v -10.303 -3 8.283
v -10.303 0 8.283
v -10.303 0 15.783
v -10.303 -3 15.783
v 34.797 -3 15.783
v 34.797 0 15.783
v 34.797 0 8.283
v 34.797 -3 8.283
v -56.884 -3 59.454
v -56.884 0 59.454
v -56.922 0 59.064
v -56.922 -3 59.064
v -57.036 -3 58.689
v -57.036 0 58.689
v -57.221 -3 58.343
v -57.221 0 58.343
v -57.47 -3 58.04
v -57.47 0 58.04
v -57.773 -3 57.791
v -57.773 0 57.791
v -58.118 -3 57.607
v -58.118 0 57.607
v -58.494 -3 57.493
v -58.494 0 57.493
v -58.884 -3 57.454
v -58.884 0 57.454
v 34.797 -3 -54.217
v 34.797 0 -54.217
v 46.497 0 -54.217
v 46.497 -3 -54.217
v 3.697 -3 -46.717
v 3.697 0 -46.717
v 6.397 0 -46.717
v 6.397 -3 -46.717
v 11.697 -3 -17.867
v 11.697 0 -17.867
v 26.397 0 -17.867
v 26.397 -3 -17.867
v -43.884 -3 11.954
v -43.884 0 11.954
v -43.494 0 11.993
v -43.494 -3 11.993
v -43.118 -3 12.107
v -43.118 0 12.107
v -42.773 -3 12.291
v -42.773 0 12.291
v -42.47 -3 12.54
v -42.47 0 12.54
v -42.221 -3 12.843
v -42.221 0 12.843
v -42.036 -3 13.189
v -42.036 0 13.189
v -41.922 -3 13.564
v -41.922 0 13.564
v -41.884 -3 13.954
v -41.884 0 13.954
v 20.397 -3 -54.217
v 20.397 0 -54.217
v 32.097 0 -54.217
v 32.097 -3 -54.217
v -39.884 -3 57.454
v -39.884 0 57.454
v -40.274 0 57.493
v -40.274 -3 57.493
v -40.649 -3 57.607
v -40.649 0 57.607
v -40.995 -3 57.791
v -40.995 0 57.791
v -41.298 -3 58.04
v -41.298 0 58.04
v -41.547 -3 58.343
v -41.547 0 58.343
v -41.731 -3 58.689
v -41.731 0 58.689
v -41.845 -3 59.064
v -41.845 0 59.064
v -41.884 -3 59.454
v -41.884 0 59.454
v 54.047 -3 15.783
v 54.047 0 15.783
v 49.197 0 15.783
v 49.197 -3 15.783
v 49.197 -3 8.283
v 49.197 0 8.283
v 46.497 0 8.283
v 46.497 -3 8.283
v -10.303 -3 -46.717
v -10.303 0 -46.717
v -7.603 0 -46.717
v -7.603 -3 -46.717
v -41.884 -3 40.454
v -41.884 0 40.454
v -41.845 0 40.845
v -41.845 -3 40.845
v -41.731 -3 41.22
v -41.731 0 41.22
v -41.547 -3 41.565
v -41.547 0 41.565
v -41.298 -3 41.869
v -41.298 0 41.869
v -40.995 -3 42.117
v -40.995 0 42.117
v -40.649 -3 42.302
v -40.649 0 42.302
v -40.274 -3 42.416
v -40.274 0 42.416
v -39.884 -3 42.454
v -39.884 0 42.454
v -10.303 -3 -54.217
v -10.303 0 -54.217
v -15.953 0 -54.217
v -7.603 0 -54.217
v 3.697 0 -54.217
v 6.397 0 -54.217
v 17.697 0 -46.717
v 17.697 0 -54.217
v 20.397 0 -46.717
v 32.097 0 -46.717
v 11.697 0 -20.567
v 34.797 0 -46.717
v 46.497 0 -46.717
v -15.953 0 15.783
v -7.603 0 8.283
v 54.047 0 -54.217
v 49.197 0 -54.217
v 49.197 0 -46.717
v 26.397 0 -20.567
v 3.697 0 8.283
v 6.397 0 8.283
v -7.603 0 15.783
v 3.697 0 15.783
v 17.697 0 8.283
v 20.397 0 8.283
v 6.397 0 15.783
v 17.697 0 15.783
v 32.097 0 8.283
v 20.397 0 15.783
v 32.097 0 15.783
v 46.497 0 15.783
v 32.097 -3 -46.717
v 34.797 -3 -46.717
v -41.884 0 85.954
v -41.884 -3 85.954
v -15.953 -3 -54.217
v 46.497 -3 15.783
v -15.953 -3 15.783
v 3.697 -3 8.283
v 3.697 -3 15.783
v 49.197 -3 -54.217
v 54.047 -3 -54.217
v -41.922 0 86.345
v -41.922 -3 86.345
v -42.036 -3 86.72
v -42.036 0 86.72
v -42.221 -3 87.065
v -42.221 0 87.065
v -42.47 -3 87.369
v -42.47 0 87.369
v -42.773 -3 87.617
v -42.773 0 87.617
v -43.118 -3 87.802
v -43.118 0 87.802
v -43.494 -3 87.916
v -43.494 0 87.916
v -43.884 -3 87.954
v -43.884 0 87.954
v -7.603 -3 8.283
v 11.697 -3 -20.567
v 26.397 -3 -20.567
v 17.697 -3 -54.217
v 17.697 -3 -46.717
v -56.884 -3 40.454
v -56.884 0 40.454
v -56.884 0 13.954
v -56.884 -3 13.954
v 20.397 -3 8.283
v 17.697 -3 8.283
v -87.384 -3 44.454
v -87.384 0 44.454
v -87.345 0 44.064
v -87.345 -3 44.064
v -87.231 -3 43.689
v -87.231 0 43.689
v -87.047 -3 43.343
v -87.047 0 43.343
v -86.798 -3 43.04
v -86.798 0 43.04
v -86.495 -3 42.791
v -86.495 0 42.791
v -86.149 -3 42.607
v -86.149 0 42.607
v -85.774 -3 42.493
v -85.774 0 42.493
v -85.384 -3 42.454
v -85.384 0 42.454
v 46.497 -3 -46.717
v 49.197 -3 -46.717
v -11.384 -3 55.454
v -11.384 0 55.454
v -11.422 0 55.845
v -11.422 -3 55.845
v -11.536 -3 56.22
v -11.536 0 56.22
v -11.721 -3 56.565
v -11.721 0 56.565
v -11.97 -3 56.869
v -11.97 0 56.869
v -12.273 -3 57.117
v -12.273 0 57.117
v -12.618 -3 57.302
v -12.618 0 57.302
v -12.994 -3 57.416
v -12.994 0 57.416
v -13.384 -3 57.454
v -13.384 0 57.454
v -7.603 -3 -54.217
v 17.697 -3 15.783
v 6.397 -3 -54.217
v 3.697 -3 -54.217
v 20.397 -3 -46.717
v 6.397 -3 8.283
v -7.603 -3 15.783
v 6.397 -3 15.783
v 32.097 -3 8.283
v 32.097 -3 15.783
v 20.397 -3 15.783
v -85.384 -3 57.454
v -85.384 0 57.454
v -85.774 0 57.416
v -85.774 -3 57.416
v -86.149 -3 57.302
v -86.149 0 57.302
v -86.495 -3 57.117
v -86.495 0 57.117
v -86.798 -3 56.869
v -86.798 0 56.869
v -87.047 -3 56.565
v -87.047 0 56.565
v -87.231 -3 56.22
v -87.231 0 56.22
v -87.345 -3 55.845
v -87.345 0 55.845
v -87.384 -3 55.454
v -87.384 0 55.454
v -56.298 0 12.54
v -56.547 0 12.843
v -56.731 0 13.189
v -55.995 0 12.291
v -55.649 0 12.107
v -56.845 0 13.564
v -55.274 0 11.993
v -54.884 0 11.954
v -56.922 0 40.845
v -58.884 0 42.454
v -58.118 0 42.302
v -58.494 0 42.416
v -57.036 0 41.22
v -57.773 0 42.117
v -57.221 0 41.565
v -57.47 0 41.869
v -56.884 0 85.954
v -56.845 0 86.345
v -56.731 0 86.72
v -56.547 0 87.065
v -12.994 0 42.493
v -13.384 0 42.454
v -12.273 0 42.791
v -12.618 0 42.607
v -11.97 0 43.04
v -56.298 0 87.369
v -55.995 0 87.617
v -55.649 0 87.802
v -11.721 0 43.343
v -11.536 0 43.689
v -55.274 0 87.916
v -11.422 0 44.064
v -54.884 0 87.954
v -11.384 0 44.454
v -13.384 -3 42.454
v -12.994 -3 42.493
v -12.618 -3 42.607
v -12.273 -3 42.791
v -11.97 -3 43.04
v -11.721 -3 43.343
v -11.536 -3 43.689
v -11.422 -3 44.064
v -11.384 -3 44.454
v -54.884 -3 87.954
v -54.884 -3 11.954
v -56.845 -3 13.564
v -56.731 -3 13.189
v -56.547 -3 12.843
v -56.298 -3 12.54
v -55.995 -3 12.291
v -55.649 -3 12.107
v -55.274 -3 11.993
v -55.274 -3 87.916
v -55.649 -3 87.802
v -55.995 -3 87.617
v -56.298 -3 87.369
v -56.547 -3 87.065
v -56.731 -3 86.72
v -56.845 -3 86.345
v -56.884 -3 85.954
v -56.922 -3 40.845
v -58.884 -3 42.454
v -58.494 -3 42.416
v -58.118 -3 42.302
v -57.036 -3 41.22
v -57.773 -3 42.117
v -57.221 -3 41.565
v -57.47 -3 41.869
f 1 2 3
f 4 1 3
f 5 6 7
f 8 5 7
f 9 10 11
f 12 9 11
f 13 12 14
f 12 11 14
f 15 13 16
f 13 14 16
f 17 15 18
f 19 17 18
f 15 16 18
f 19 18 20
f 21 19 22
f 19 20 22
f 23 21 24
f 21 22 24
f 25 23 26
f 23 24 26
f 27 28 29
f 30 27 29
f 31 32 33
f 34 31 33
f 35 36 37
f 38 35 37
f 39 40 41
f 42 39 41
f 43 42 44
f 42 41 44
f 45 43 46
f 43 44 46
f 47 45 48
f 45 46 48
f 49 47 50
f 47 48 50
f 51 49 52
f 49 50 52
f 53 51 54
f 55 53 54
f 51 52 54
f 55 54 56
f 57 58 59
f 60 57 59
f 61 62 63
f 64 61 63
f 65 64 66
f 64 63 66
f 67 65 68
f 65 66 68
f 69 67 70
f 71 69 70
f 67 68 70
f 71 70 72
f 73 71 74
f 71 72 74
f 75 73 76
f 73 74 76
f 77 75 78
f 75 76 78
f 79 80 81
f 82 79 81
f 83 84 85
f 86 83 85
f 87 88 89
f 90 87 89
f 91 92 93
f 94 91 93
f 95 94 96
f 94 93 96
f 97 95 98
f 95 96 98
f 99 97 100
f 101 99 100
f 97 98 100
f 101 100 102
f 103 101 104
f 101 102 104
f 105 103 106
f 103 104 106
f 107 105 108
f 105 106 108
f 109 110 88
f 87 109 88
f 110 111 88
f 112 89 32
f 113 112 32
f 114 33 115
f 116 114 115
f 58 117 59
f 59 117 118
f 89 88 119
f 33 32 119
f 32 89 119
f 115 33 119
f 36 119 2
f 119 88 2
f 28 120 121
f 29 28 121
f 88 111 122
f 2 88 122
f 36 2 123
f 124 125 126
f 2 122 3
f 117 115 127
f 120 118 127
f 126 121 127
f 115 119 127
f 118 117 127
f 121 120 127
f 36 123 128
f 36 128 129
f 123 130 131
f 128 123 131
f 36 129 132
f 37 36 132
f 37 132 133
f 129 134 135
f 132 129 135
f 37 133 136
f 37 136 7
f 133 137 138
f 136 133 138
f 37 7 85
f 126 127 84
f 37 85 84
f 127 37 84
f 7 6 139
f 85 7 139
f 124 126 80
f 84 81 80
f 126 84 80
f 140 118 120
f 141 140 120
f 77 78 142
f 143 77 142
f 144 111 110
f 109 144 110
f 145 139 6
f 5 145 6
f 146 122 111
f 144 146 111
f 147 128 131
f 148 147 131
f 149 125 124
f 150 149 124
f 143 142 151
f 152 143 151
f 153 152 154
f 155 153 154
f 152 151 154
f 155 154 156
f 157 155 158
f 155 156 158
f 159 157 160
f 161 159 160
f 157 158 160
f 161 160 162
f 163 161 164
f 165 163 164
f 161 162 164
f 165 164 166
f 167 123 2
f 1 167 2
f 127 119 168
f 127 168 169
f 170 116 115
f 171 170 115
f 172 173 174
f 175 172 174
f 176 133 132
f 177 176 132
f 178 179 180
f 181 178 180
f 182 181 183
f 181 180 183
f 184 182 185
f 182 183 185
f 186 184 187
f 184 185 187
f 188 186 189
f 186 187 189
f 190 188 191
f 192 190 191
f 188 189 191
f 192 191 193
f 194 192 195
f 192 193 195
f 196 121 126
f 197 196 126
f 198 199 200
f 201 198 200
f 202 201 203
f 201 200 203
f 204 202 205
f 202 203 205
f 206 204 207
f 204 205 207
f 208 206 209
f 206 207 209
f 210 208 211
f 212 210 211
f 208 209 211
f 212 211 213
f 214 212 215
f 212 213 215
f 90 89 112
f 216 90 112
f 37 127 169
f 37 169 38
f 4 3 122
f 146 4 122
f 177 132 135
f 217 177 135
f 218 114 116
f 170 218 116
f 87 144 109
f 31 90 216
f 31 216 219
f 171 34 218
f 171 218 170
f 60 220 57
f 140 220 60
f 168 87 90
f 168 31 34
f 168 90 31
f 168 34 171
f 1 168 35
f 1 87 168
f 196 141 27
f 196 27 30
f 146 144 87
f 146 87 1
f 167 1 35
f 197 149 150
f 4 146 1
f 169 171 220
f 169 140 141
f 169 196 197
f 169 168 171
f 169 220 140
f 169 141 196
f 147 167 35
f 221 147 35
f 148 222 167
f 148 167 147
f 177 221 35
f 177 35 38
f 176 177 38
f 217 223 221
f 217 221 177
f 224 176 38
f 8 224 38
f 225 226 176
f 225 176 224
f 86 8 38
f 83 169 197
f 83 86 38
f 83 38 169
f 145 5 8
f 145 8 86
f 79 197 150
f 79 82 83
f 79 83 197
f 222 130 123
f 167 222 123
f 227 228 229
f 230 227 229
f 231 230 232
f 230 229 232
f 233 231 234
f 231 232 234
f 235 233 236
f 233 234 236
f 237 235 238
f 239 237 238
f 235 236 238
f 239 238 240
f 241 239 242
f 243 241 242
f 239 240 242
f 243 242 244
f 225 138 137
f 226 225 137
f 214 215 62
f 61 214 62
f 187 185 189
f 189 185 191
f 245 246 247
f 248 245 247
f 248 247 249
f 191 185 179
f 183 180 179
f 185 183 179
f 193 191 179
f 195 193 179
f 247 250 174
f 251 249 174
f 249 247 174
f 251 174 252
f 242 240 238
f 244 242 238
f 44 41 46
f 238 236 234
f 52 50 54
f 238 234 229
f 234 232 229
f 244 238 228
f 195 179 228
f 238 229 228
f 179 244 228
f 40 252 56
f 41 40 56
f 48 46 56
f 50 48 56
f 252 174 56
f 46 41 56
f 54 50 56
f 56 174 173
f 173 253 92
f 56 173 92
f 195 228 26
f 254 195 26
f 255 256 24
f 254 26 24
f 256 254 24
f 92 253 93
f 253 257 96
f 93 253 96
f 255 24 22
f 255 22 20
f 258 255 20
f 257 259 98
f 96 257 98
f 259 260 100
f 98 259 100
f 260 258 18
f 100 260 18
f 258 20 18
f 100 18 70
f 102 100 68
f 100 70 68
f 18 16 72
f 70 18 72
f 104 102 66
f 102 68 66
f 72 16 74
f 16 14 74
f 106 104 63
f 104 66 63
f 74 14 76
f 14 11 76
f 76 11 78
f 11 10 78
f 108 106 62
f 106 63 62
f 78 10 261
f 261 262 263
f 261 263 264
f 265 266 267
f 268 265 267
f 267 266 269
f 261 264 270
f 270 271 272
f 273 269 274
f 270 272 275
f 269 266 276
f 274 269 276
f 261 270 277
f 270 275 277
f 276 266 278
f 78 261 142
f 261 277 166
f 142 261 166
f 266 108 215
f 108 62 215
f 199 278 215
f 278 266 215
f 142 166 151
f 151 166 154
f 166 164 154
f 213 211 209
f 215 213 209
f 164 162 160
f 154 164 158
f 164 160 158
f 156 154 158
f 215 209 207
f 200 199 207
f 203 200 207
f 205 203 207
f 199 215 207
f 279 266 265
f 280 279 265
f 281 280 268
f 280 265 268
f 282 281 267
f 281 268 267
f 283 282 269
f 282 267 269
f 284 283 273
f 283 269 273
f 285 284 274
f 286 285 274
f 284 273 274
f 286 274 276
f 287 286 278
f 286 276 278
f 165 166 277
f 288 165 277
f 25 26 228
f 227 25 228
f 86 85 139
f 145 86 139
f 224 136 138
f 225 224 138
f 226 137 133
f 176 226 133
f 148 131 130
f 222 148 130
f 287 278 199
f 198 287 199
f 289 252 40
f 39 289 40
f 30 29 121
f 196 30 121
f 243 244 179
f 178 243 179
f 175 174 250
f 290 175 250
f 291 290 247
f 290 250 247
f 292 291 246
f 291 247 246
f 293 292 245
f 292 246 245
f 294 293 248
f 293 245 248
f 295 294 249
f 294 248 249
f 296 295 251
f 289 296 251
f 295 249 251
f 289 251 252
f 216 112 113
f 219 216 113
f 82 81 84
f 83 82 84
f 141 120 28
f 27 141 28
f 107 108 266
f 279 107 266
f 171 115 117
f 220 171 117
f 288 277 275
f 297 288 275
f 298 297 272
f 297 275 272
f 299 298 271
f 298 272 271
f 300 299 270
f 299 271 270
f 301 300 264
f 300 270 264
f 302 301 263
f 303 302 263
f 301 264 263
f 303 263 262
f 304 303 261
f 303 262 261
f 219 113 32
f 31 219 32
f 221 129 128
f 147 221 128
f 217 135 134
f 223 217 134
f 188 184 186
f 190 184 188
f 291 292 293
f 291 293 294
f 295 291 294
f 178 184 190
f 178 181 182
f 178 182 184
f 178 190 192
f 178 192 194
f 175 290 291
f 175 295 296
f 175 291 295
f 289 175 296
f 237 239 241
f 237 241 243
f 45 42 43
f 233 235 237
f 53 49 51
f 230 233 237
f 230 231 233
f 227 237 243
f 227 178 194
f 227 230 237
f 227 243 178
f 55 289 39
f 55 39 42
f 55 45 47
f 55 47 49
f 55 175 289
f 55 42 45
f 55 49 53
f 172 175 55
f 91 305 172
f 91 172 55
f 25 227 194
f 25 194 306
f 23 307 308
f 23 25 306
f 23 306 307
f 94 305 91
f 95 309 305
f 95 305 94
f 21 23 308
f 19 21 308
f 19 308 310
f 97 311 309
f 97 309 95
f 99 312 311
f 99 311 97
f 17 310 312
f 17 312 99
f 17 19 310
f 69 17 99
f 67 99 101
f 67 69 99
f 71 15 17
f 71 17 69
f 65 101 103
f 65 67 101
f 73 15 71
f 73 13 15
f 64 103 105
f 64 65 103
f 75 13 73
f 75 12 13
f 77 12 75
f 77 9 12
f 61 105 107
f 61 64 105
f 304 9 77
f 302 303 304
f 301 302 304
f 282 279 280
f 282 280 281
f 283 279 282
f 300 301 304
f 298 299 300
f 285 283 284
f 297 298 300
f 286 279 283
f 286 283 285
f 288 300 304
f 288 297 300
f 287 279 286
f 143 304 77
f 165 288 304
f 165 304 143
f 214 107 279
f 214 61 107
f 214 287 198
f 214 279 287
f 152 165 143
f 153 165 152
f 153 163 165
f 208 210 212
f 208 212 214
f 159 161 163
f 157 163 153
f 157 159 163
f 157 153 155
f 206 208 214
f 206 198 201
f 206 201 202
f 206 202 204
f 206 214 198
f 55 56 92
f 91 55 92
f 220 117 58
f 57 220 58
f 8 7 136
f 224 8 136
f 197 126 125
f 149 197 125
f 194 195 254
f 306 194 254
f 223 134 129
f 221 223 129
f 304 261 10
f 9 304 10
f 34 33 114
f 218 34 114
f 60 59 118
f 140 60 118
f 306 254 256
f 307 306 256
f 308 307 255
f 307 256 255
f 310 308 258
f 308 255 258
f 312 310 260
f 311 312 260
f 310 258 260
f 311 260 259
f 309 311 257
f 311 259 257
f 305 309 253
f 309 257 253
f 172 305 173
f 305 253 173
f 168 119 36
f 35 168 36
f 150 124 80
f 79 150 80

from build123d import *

# Parameters (mm, degrees)
F1_DEPTH = 3
F2_W     = 14.7
F2_H     = 2.7
F3_DEPTH = 3


# Not quite as in the source:
# - ends of sketch curves that miss each other by under 0.0002 mm in the source are joined


with BuildPart() as f1:
    # F0 (on Front) → F1 (new body)
    with BuildSketch(Plane.XZ):
        with BuildLine():
            ThreePointArc((-56.8837374449, 13.9543364197), (-56.2979510073, 12.5401228573), (-54.8837374449, 11.9543364197))
            Line((-54.8837374449, 11.9543364197), (-43.8837374449, 11.9543364197))
            ThreePointArc((-43.8837374449, 11.9543364197), (-42.4695238825, 12.5401228573), (-41.8837374449, 13.9543364197))
            Line((-41.8837374449, 13.9543364197), (-41.8837374449, 40.4543364197))
            ThreePointArc((-41.8837374449, 40.4543364197), (-41.2979510073, 41.8685499821), (-39.8837374449, 42.4543364197))
            Line((-39.8837374449, 42.4543364197), (-13.3837374449, 42.4543364197))
            ThreePointArc((-13.3837374449, 42.4543364197), (-11.9695238825, 43.0401228573), (-11.3837374449, 44.4543364197))
            Line((-11.3837374449, 44.4543364197), (-11.3837374449, 55.4543364197))
            ThreePointArc((-11.3837374449, 55.4543364197), (-11.9695238825, 56.8685499821), (-13.3837374449, 57.4543364197))
            Line((-13.3837374449, 57.4543364197), (-39.8837374449, 57.4543364197))
            ThreePointArc((-39.8837374449, 57.4543364197), (-41.2979510073, 58.0401228573), (-41.8837374449, 59.4543364197))
            Line((-41.8837374449, 59.4543364197), (-41.8837374449, 85.9543364197))
            ThreePointArc((-41.8837374449, 85.9543364197), (-42.4695238825, 87.3685499821), (-43.8837374449, 87.9543364197))
            Line((-43.8837374449, 87.9543364197), (-54.8837374449, 87.9543364197))
            ThreePointArc((-54.8837374449, 87.9543364197), (-56.2979510073, 87.3685499821), (-56.8837374449, 85.9543364197))
            Line((-56.8837374449, 85.9543364197), (-56.8837374449, 59.4543364197))
            ThreePointArc((-56.8837374449, 59.4543364197), (-57.4695238825, 58.0401228573), (-58.8837374449, 57.4543364197))
            Line((-58.8837374449, 57.4543364197), (-85.3837374449, 57.4543364197))
            ThreePointArc((-85.3837374449, 57.4543364197), (-86.7979532126, 56.8685499821), (-87.3837396502, 55.4543364197))
            Line((-87.3837396502, 55.4543364197), (-87.3837374449, 44.4543364197))
            ThreePointArc((-87.3837374449, 44.4543364197), (-86.7979510073, 43.0401228573), (-85.3837374449, 42.4543364197))
            Line((-85.3837374449, 42.4543364197), (-58.8837374449, 42.4543364197))
            ThreePointArc((-58.8837374449, 42.4543364197), (-57.4695238825, 41.8685499821), (-56.8837374449, 40.4543364197))
            Line((-56.8837374449, 40.4543364197), (-56.8837374449, 13.9543364197))
        make_face()
    extrude(amount=F1_DEPTH)


with BuildPart() as f3:
    # F2 (on Front) → F3 (new body)
    with BuildSketch(Plane.XZ):
        Polygon((54.0467553358, -54.2169875913), (54.0467553358, 15.7830124087), (49.1967553358, 15.7830124087), (49.1967553358, 8.2830124087), (46.4967553358, 8.2830124087), (46.4967553358, 15.7830124087), (34.7967553358, 15.7830124087), (34.7967553358, 8.2830124087), (32.0967553358, 8.2830124087), (32.0967553358, 15.7830124087), (20.3967553358, 15.7830124087), (20.3967553358, 8.2830124087), (17.6967553358, 8.2830124087), (17.6967553358, 15.7830124087), (6.3967553358, 15.7830124087), (6.3967553358, 8.2830124087), (3.6967553358, 8.2830124087), (3.6967553358, 15.7830124087), (-7.6032446642, 15.7830124087), (-7.6032446642, 8.2830124087), (-10.3032446642, 8.2830124087), (-10.3032446642, 15.7830124087), (-15.9532446642, 15.7830124087), (-15.9532446642, -54.2169875913), (-10.3032446642, -54.2169875913), (-10.3032446642, -46.7169875913), (-7.6032446642, -46.7169875913), (-7.6032446642, -54.2169875913), (3.6967553358, -54.2169875913), (3.6967553358, -46.7169875913), (6.3967553358, -46.7169875913), (6.3967553358, -54.2169875913), (17.6967553358, -54.2169875913), (17.6967553358, -46.7169875913), (20.3967553358, -46.7169875913), (20.3967553358, -54.2169875913), (32.0967553358, -54.2169875913), (32.0967553358, -46.7169875913), (34.7967553358, -46.7169875913), (34.7967553358, -54.2169875913), (46.4967553358, -54.2169875913), (46.4967553358, -46.7169875913), (49.1967553358, -46.7169875913), (49.1967553358, -54.2169875913), align=None)
        with Locations((19.0467553358, -19.2169875913)):
            Rectangle(F2_W, F2_H, mode=Mode.SUBTRACT)
    extrude(amount=F3_DEPTH)


solid = Compound([f1.part, f3.part])
